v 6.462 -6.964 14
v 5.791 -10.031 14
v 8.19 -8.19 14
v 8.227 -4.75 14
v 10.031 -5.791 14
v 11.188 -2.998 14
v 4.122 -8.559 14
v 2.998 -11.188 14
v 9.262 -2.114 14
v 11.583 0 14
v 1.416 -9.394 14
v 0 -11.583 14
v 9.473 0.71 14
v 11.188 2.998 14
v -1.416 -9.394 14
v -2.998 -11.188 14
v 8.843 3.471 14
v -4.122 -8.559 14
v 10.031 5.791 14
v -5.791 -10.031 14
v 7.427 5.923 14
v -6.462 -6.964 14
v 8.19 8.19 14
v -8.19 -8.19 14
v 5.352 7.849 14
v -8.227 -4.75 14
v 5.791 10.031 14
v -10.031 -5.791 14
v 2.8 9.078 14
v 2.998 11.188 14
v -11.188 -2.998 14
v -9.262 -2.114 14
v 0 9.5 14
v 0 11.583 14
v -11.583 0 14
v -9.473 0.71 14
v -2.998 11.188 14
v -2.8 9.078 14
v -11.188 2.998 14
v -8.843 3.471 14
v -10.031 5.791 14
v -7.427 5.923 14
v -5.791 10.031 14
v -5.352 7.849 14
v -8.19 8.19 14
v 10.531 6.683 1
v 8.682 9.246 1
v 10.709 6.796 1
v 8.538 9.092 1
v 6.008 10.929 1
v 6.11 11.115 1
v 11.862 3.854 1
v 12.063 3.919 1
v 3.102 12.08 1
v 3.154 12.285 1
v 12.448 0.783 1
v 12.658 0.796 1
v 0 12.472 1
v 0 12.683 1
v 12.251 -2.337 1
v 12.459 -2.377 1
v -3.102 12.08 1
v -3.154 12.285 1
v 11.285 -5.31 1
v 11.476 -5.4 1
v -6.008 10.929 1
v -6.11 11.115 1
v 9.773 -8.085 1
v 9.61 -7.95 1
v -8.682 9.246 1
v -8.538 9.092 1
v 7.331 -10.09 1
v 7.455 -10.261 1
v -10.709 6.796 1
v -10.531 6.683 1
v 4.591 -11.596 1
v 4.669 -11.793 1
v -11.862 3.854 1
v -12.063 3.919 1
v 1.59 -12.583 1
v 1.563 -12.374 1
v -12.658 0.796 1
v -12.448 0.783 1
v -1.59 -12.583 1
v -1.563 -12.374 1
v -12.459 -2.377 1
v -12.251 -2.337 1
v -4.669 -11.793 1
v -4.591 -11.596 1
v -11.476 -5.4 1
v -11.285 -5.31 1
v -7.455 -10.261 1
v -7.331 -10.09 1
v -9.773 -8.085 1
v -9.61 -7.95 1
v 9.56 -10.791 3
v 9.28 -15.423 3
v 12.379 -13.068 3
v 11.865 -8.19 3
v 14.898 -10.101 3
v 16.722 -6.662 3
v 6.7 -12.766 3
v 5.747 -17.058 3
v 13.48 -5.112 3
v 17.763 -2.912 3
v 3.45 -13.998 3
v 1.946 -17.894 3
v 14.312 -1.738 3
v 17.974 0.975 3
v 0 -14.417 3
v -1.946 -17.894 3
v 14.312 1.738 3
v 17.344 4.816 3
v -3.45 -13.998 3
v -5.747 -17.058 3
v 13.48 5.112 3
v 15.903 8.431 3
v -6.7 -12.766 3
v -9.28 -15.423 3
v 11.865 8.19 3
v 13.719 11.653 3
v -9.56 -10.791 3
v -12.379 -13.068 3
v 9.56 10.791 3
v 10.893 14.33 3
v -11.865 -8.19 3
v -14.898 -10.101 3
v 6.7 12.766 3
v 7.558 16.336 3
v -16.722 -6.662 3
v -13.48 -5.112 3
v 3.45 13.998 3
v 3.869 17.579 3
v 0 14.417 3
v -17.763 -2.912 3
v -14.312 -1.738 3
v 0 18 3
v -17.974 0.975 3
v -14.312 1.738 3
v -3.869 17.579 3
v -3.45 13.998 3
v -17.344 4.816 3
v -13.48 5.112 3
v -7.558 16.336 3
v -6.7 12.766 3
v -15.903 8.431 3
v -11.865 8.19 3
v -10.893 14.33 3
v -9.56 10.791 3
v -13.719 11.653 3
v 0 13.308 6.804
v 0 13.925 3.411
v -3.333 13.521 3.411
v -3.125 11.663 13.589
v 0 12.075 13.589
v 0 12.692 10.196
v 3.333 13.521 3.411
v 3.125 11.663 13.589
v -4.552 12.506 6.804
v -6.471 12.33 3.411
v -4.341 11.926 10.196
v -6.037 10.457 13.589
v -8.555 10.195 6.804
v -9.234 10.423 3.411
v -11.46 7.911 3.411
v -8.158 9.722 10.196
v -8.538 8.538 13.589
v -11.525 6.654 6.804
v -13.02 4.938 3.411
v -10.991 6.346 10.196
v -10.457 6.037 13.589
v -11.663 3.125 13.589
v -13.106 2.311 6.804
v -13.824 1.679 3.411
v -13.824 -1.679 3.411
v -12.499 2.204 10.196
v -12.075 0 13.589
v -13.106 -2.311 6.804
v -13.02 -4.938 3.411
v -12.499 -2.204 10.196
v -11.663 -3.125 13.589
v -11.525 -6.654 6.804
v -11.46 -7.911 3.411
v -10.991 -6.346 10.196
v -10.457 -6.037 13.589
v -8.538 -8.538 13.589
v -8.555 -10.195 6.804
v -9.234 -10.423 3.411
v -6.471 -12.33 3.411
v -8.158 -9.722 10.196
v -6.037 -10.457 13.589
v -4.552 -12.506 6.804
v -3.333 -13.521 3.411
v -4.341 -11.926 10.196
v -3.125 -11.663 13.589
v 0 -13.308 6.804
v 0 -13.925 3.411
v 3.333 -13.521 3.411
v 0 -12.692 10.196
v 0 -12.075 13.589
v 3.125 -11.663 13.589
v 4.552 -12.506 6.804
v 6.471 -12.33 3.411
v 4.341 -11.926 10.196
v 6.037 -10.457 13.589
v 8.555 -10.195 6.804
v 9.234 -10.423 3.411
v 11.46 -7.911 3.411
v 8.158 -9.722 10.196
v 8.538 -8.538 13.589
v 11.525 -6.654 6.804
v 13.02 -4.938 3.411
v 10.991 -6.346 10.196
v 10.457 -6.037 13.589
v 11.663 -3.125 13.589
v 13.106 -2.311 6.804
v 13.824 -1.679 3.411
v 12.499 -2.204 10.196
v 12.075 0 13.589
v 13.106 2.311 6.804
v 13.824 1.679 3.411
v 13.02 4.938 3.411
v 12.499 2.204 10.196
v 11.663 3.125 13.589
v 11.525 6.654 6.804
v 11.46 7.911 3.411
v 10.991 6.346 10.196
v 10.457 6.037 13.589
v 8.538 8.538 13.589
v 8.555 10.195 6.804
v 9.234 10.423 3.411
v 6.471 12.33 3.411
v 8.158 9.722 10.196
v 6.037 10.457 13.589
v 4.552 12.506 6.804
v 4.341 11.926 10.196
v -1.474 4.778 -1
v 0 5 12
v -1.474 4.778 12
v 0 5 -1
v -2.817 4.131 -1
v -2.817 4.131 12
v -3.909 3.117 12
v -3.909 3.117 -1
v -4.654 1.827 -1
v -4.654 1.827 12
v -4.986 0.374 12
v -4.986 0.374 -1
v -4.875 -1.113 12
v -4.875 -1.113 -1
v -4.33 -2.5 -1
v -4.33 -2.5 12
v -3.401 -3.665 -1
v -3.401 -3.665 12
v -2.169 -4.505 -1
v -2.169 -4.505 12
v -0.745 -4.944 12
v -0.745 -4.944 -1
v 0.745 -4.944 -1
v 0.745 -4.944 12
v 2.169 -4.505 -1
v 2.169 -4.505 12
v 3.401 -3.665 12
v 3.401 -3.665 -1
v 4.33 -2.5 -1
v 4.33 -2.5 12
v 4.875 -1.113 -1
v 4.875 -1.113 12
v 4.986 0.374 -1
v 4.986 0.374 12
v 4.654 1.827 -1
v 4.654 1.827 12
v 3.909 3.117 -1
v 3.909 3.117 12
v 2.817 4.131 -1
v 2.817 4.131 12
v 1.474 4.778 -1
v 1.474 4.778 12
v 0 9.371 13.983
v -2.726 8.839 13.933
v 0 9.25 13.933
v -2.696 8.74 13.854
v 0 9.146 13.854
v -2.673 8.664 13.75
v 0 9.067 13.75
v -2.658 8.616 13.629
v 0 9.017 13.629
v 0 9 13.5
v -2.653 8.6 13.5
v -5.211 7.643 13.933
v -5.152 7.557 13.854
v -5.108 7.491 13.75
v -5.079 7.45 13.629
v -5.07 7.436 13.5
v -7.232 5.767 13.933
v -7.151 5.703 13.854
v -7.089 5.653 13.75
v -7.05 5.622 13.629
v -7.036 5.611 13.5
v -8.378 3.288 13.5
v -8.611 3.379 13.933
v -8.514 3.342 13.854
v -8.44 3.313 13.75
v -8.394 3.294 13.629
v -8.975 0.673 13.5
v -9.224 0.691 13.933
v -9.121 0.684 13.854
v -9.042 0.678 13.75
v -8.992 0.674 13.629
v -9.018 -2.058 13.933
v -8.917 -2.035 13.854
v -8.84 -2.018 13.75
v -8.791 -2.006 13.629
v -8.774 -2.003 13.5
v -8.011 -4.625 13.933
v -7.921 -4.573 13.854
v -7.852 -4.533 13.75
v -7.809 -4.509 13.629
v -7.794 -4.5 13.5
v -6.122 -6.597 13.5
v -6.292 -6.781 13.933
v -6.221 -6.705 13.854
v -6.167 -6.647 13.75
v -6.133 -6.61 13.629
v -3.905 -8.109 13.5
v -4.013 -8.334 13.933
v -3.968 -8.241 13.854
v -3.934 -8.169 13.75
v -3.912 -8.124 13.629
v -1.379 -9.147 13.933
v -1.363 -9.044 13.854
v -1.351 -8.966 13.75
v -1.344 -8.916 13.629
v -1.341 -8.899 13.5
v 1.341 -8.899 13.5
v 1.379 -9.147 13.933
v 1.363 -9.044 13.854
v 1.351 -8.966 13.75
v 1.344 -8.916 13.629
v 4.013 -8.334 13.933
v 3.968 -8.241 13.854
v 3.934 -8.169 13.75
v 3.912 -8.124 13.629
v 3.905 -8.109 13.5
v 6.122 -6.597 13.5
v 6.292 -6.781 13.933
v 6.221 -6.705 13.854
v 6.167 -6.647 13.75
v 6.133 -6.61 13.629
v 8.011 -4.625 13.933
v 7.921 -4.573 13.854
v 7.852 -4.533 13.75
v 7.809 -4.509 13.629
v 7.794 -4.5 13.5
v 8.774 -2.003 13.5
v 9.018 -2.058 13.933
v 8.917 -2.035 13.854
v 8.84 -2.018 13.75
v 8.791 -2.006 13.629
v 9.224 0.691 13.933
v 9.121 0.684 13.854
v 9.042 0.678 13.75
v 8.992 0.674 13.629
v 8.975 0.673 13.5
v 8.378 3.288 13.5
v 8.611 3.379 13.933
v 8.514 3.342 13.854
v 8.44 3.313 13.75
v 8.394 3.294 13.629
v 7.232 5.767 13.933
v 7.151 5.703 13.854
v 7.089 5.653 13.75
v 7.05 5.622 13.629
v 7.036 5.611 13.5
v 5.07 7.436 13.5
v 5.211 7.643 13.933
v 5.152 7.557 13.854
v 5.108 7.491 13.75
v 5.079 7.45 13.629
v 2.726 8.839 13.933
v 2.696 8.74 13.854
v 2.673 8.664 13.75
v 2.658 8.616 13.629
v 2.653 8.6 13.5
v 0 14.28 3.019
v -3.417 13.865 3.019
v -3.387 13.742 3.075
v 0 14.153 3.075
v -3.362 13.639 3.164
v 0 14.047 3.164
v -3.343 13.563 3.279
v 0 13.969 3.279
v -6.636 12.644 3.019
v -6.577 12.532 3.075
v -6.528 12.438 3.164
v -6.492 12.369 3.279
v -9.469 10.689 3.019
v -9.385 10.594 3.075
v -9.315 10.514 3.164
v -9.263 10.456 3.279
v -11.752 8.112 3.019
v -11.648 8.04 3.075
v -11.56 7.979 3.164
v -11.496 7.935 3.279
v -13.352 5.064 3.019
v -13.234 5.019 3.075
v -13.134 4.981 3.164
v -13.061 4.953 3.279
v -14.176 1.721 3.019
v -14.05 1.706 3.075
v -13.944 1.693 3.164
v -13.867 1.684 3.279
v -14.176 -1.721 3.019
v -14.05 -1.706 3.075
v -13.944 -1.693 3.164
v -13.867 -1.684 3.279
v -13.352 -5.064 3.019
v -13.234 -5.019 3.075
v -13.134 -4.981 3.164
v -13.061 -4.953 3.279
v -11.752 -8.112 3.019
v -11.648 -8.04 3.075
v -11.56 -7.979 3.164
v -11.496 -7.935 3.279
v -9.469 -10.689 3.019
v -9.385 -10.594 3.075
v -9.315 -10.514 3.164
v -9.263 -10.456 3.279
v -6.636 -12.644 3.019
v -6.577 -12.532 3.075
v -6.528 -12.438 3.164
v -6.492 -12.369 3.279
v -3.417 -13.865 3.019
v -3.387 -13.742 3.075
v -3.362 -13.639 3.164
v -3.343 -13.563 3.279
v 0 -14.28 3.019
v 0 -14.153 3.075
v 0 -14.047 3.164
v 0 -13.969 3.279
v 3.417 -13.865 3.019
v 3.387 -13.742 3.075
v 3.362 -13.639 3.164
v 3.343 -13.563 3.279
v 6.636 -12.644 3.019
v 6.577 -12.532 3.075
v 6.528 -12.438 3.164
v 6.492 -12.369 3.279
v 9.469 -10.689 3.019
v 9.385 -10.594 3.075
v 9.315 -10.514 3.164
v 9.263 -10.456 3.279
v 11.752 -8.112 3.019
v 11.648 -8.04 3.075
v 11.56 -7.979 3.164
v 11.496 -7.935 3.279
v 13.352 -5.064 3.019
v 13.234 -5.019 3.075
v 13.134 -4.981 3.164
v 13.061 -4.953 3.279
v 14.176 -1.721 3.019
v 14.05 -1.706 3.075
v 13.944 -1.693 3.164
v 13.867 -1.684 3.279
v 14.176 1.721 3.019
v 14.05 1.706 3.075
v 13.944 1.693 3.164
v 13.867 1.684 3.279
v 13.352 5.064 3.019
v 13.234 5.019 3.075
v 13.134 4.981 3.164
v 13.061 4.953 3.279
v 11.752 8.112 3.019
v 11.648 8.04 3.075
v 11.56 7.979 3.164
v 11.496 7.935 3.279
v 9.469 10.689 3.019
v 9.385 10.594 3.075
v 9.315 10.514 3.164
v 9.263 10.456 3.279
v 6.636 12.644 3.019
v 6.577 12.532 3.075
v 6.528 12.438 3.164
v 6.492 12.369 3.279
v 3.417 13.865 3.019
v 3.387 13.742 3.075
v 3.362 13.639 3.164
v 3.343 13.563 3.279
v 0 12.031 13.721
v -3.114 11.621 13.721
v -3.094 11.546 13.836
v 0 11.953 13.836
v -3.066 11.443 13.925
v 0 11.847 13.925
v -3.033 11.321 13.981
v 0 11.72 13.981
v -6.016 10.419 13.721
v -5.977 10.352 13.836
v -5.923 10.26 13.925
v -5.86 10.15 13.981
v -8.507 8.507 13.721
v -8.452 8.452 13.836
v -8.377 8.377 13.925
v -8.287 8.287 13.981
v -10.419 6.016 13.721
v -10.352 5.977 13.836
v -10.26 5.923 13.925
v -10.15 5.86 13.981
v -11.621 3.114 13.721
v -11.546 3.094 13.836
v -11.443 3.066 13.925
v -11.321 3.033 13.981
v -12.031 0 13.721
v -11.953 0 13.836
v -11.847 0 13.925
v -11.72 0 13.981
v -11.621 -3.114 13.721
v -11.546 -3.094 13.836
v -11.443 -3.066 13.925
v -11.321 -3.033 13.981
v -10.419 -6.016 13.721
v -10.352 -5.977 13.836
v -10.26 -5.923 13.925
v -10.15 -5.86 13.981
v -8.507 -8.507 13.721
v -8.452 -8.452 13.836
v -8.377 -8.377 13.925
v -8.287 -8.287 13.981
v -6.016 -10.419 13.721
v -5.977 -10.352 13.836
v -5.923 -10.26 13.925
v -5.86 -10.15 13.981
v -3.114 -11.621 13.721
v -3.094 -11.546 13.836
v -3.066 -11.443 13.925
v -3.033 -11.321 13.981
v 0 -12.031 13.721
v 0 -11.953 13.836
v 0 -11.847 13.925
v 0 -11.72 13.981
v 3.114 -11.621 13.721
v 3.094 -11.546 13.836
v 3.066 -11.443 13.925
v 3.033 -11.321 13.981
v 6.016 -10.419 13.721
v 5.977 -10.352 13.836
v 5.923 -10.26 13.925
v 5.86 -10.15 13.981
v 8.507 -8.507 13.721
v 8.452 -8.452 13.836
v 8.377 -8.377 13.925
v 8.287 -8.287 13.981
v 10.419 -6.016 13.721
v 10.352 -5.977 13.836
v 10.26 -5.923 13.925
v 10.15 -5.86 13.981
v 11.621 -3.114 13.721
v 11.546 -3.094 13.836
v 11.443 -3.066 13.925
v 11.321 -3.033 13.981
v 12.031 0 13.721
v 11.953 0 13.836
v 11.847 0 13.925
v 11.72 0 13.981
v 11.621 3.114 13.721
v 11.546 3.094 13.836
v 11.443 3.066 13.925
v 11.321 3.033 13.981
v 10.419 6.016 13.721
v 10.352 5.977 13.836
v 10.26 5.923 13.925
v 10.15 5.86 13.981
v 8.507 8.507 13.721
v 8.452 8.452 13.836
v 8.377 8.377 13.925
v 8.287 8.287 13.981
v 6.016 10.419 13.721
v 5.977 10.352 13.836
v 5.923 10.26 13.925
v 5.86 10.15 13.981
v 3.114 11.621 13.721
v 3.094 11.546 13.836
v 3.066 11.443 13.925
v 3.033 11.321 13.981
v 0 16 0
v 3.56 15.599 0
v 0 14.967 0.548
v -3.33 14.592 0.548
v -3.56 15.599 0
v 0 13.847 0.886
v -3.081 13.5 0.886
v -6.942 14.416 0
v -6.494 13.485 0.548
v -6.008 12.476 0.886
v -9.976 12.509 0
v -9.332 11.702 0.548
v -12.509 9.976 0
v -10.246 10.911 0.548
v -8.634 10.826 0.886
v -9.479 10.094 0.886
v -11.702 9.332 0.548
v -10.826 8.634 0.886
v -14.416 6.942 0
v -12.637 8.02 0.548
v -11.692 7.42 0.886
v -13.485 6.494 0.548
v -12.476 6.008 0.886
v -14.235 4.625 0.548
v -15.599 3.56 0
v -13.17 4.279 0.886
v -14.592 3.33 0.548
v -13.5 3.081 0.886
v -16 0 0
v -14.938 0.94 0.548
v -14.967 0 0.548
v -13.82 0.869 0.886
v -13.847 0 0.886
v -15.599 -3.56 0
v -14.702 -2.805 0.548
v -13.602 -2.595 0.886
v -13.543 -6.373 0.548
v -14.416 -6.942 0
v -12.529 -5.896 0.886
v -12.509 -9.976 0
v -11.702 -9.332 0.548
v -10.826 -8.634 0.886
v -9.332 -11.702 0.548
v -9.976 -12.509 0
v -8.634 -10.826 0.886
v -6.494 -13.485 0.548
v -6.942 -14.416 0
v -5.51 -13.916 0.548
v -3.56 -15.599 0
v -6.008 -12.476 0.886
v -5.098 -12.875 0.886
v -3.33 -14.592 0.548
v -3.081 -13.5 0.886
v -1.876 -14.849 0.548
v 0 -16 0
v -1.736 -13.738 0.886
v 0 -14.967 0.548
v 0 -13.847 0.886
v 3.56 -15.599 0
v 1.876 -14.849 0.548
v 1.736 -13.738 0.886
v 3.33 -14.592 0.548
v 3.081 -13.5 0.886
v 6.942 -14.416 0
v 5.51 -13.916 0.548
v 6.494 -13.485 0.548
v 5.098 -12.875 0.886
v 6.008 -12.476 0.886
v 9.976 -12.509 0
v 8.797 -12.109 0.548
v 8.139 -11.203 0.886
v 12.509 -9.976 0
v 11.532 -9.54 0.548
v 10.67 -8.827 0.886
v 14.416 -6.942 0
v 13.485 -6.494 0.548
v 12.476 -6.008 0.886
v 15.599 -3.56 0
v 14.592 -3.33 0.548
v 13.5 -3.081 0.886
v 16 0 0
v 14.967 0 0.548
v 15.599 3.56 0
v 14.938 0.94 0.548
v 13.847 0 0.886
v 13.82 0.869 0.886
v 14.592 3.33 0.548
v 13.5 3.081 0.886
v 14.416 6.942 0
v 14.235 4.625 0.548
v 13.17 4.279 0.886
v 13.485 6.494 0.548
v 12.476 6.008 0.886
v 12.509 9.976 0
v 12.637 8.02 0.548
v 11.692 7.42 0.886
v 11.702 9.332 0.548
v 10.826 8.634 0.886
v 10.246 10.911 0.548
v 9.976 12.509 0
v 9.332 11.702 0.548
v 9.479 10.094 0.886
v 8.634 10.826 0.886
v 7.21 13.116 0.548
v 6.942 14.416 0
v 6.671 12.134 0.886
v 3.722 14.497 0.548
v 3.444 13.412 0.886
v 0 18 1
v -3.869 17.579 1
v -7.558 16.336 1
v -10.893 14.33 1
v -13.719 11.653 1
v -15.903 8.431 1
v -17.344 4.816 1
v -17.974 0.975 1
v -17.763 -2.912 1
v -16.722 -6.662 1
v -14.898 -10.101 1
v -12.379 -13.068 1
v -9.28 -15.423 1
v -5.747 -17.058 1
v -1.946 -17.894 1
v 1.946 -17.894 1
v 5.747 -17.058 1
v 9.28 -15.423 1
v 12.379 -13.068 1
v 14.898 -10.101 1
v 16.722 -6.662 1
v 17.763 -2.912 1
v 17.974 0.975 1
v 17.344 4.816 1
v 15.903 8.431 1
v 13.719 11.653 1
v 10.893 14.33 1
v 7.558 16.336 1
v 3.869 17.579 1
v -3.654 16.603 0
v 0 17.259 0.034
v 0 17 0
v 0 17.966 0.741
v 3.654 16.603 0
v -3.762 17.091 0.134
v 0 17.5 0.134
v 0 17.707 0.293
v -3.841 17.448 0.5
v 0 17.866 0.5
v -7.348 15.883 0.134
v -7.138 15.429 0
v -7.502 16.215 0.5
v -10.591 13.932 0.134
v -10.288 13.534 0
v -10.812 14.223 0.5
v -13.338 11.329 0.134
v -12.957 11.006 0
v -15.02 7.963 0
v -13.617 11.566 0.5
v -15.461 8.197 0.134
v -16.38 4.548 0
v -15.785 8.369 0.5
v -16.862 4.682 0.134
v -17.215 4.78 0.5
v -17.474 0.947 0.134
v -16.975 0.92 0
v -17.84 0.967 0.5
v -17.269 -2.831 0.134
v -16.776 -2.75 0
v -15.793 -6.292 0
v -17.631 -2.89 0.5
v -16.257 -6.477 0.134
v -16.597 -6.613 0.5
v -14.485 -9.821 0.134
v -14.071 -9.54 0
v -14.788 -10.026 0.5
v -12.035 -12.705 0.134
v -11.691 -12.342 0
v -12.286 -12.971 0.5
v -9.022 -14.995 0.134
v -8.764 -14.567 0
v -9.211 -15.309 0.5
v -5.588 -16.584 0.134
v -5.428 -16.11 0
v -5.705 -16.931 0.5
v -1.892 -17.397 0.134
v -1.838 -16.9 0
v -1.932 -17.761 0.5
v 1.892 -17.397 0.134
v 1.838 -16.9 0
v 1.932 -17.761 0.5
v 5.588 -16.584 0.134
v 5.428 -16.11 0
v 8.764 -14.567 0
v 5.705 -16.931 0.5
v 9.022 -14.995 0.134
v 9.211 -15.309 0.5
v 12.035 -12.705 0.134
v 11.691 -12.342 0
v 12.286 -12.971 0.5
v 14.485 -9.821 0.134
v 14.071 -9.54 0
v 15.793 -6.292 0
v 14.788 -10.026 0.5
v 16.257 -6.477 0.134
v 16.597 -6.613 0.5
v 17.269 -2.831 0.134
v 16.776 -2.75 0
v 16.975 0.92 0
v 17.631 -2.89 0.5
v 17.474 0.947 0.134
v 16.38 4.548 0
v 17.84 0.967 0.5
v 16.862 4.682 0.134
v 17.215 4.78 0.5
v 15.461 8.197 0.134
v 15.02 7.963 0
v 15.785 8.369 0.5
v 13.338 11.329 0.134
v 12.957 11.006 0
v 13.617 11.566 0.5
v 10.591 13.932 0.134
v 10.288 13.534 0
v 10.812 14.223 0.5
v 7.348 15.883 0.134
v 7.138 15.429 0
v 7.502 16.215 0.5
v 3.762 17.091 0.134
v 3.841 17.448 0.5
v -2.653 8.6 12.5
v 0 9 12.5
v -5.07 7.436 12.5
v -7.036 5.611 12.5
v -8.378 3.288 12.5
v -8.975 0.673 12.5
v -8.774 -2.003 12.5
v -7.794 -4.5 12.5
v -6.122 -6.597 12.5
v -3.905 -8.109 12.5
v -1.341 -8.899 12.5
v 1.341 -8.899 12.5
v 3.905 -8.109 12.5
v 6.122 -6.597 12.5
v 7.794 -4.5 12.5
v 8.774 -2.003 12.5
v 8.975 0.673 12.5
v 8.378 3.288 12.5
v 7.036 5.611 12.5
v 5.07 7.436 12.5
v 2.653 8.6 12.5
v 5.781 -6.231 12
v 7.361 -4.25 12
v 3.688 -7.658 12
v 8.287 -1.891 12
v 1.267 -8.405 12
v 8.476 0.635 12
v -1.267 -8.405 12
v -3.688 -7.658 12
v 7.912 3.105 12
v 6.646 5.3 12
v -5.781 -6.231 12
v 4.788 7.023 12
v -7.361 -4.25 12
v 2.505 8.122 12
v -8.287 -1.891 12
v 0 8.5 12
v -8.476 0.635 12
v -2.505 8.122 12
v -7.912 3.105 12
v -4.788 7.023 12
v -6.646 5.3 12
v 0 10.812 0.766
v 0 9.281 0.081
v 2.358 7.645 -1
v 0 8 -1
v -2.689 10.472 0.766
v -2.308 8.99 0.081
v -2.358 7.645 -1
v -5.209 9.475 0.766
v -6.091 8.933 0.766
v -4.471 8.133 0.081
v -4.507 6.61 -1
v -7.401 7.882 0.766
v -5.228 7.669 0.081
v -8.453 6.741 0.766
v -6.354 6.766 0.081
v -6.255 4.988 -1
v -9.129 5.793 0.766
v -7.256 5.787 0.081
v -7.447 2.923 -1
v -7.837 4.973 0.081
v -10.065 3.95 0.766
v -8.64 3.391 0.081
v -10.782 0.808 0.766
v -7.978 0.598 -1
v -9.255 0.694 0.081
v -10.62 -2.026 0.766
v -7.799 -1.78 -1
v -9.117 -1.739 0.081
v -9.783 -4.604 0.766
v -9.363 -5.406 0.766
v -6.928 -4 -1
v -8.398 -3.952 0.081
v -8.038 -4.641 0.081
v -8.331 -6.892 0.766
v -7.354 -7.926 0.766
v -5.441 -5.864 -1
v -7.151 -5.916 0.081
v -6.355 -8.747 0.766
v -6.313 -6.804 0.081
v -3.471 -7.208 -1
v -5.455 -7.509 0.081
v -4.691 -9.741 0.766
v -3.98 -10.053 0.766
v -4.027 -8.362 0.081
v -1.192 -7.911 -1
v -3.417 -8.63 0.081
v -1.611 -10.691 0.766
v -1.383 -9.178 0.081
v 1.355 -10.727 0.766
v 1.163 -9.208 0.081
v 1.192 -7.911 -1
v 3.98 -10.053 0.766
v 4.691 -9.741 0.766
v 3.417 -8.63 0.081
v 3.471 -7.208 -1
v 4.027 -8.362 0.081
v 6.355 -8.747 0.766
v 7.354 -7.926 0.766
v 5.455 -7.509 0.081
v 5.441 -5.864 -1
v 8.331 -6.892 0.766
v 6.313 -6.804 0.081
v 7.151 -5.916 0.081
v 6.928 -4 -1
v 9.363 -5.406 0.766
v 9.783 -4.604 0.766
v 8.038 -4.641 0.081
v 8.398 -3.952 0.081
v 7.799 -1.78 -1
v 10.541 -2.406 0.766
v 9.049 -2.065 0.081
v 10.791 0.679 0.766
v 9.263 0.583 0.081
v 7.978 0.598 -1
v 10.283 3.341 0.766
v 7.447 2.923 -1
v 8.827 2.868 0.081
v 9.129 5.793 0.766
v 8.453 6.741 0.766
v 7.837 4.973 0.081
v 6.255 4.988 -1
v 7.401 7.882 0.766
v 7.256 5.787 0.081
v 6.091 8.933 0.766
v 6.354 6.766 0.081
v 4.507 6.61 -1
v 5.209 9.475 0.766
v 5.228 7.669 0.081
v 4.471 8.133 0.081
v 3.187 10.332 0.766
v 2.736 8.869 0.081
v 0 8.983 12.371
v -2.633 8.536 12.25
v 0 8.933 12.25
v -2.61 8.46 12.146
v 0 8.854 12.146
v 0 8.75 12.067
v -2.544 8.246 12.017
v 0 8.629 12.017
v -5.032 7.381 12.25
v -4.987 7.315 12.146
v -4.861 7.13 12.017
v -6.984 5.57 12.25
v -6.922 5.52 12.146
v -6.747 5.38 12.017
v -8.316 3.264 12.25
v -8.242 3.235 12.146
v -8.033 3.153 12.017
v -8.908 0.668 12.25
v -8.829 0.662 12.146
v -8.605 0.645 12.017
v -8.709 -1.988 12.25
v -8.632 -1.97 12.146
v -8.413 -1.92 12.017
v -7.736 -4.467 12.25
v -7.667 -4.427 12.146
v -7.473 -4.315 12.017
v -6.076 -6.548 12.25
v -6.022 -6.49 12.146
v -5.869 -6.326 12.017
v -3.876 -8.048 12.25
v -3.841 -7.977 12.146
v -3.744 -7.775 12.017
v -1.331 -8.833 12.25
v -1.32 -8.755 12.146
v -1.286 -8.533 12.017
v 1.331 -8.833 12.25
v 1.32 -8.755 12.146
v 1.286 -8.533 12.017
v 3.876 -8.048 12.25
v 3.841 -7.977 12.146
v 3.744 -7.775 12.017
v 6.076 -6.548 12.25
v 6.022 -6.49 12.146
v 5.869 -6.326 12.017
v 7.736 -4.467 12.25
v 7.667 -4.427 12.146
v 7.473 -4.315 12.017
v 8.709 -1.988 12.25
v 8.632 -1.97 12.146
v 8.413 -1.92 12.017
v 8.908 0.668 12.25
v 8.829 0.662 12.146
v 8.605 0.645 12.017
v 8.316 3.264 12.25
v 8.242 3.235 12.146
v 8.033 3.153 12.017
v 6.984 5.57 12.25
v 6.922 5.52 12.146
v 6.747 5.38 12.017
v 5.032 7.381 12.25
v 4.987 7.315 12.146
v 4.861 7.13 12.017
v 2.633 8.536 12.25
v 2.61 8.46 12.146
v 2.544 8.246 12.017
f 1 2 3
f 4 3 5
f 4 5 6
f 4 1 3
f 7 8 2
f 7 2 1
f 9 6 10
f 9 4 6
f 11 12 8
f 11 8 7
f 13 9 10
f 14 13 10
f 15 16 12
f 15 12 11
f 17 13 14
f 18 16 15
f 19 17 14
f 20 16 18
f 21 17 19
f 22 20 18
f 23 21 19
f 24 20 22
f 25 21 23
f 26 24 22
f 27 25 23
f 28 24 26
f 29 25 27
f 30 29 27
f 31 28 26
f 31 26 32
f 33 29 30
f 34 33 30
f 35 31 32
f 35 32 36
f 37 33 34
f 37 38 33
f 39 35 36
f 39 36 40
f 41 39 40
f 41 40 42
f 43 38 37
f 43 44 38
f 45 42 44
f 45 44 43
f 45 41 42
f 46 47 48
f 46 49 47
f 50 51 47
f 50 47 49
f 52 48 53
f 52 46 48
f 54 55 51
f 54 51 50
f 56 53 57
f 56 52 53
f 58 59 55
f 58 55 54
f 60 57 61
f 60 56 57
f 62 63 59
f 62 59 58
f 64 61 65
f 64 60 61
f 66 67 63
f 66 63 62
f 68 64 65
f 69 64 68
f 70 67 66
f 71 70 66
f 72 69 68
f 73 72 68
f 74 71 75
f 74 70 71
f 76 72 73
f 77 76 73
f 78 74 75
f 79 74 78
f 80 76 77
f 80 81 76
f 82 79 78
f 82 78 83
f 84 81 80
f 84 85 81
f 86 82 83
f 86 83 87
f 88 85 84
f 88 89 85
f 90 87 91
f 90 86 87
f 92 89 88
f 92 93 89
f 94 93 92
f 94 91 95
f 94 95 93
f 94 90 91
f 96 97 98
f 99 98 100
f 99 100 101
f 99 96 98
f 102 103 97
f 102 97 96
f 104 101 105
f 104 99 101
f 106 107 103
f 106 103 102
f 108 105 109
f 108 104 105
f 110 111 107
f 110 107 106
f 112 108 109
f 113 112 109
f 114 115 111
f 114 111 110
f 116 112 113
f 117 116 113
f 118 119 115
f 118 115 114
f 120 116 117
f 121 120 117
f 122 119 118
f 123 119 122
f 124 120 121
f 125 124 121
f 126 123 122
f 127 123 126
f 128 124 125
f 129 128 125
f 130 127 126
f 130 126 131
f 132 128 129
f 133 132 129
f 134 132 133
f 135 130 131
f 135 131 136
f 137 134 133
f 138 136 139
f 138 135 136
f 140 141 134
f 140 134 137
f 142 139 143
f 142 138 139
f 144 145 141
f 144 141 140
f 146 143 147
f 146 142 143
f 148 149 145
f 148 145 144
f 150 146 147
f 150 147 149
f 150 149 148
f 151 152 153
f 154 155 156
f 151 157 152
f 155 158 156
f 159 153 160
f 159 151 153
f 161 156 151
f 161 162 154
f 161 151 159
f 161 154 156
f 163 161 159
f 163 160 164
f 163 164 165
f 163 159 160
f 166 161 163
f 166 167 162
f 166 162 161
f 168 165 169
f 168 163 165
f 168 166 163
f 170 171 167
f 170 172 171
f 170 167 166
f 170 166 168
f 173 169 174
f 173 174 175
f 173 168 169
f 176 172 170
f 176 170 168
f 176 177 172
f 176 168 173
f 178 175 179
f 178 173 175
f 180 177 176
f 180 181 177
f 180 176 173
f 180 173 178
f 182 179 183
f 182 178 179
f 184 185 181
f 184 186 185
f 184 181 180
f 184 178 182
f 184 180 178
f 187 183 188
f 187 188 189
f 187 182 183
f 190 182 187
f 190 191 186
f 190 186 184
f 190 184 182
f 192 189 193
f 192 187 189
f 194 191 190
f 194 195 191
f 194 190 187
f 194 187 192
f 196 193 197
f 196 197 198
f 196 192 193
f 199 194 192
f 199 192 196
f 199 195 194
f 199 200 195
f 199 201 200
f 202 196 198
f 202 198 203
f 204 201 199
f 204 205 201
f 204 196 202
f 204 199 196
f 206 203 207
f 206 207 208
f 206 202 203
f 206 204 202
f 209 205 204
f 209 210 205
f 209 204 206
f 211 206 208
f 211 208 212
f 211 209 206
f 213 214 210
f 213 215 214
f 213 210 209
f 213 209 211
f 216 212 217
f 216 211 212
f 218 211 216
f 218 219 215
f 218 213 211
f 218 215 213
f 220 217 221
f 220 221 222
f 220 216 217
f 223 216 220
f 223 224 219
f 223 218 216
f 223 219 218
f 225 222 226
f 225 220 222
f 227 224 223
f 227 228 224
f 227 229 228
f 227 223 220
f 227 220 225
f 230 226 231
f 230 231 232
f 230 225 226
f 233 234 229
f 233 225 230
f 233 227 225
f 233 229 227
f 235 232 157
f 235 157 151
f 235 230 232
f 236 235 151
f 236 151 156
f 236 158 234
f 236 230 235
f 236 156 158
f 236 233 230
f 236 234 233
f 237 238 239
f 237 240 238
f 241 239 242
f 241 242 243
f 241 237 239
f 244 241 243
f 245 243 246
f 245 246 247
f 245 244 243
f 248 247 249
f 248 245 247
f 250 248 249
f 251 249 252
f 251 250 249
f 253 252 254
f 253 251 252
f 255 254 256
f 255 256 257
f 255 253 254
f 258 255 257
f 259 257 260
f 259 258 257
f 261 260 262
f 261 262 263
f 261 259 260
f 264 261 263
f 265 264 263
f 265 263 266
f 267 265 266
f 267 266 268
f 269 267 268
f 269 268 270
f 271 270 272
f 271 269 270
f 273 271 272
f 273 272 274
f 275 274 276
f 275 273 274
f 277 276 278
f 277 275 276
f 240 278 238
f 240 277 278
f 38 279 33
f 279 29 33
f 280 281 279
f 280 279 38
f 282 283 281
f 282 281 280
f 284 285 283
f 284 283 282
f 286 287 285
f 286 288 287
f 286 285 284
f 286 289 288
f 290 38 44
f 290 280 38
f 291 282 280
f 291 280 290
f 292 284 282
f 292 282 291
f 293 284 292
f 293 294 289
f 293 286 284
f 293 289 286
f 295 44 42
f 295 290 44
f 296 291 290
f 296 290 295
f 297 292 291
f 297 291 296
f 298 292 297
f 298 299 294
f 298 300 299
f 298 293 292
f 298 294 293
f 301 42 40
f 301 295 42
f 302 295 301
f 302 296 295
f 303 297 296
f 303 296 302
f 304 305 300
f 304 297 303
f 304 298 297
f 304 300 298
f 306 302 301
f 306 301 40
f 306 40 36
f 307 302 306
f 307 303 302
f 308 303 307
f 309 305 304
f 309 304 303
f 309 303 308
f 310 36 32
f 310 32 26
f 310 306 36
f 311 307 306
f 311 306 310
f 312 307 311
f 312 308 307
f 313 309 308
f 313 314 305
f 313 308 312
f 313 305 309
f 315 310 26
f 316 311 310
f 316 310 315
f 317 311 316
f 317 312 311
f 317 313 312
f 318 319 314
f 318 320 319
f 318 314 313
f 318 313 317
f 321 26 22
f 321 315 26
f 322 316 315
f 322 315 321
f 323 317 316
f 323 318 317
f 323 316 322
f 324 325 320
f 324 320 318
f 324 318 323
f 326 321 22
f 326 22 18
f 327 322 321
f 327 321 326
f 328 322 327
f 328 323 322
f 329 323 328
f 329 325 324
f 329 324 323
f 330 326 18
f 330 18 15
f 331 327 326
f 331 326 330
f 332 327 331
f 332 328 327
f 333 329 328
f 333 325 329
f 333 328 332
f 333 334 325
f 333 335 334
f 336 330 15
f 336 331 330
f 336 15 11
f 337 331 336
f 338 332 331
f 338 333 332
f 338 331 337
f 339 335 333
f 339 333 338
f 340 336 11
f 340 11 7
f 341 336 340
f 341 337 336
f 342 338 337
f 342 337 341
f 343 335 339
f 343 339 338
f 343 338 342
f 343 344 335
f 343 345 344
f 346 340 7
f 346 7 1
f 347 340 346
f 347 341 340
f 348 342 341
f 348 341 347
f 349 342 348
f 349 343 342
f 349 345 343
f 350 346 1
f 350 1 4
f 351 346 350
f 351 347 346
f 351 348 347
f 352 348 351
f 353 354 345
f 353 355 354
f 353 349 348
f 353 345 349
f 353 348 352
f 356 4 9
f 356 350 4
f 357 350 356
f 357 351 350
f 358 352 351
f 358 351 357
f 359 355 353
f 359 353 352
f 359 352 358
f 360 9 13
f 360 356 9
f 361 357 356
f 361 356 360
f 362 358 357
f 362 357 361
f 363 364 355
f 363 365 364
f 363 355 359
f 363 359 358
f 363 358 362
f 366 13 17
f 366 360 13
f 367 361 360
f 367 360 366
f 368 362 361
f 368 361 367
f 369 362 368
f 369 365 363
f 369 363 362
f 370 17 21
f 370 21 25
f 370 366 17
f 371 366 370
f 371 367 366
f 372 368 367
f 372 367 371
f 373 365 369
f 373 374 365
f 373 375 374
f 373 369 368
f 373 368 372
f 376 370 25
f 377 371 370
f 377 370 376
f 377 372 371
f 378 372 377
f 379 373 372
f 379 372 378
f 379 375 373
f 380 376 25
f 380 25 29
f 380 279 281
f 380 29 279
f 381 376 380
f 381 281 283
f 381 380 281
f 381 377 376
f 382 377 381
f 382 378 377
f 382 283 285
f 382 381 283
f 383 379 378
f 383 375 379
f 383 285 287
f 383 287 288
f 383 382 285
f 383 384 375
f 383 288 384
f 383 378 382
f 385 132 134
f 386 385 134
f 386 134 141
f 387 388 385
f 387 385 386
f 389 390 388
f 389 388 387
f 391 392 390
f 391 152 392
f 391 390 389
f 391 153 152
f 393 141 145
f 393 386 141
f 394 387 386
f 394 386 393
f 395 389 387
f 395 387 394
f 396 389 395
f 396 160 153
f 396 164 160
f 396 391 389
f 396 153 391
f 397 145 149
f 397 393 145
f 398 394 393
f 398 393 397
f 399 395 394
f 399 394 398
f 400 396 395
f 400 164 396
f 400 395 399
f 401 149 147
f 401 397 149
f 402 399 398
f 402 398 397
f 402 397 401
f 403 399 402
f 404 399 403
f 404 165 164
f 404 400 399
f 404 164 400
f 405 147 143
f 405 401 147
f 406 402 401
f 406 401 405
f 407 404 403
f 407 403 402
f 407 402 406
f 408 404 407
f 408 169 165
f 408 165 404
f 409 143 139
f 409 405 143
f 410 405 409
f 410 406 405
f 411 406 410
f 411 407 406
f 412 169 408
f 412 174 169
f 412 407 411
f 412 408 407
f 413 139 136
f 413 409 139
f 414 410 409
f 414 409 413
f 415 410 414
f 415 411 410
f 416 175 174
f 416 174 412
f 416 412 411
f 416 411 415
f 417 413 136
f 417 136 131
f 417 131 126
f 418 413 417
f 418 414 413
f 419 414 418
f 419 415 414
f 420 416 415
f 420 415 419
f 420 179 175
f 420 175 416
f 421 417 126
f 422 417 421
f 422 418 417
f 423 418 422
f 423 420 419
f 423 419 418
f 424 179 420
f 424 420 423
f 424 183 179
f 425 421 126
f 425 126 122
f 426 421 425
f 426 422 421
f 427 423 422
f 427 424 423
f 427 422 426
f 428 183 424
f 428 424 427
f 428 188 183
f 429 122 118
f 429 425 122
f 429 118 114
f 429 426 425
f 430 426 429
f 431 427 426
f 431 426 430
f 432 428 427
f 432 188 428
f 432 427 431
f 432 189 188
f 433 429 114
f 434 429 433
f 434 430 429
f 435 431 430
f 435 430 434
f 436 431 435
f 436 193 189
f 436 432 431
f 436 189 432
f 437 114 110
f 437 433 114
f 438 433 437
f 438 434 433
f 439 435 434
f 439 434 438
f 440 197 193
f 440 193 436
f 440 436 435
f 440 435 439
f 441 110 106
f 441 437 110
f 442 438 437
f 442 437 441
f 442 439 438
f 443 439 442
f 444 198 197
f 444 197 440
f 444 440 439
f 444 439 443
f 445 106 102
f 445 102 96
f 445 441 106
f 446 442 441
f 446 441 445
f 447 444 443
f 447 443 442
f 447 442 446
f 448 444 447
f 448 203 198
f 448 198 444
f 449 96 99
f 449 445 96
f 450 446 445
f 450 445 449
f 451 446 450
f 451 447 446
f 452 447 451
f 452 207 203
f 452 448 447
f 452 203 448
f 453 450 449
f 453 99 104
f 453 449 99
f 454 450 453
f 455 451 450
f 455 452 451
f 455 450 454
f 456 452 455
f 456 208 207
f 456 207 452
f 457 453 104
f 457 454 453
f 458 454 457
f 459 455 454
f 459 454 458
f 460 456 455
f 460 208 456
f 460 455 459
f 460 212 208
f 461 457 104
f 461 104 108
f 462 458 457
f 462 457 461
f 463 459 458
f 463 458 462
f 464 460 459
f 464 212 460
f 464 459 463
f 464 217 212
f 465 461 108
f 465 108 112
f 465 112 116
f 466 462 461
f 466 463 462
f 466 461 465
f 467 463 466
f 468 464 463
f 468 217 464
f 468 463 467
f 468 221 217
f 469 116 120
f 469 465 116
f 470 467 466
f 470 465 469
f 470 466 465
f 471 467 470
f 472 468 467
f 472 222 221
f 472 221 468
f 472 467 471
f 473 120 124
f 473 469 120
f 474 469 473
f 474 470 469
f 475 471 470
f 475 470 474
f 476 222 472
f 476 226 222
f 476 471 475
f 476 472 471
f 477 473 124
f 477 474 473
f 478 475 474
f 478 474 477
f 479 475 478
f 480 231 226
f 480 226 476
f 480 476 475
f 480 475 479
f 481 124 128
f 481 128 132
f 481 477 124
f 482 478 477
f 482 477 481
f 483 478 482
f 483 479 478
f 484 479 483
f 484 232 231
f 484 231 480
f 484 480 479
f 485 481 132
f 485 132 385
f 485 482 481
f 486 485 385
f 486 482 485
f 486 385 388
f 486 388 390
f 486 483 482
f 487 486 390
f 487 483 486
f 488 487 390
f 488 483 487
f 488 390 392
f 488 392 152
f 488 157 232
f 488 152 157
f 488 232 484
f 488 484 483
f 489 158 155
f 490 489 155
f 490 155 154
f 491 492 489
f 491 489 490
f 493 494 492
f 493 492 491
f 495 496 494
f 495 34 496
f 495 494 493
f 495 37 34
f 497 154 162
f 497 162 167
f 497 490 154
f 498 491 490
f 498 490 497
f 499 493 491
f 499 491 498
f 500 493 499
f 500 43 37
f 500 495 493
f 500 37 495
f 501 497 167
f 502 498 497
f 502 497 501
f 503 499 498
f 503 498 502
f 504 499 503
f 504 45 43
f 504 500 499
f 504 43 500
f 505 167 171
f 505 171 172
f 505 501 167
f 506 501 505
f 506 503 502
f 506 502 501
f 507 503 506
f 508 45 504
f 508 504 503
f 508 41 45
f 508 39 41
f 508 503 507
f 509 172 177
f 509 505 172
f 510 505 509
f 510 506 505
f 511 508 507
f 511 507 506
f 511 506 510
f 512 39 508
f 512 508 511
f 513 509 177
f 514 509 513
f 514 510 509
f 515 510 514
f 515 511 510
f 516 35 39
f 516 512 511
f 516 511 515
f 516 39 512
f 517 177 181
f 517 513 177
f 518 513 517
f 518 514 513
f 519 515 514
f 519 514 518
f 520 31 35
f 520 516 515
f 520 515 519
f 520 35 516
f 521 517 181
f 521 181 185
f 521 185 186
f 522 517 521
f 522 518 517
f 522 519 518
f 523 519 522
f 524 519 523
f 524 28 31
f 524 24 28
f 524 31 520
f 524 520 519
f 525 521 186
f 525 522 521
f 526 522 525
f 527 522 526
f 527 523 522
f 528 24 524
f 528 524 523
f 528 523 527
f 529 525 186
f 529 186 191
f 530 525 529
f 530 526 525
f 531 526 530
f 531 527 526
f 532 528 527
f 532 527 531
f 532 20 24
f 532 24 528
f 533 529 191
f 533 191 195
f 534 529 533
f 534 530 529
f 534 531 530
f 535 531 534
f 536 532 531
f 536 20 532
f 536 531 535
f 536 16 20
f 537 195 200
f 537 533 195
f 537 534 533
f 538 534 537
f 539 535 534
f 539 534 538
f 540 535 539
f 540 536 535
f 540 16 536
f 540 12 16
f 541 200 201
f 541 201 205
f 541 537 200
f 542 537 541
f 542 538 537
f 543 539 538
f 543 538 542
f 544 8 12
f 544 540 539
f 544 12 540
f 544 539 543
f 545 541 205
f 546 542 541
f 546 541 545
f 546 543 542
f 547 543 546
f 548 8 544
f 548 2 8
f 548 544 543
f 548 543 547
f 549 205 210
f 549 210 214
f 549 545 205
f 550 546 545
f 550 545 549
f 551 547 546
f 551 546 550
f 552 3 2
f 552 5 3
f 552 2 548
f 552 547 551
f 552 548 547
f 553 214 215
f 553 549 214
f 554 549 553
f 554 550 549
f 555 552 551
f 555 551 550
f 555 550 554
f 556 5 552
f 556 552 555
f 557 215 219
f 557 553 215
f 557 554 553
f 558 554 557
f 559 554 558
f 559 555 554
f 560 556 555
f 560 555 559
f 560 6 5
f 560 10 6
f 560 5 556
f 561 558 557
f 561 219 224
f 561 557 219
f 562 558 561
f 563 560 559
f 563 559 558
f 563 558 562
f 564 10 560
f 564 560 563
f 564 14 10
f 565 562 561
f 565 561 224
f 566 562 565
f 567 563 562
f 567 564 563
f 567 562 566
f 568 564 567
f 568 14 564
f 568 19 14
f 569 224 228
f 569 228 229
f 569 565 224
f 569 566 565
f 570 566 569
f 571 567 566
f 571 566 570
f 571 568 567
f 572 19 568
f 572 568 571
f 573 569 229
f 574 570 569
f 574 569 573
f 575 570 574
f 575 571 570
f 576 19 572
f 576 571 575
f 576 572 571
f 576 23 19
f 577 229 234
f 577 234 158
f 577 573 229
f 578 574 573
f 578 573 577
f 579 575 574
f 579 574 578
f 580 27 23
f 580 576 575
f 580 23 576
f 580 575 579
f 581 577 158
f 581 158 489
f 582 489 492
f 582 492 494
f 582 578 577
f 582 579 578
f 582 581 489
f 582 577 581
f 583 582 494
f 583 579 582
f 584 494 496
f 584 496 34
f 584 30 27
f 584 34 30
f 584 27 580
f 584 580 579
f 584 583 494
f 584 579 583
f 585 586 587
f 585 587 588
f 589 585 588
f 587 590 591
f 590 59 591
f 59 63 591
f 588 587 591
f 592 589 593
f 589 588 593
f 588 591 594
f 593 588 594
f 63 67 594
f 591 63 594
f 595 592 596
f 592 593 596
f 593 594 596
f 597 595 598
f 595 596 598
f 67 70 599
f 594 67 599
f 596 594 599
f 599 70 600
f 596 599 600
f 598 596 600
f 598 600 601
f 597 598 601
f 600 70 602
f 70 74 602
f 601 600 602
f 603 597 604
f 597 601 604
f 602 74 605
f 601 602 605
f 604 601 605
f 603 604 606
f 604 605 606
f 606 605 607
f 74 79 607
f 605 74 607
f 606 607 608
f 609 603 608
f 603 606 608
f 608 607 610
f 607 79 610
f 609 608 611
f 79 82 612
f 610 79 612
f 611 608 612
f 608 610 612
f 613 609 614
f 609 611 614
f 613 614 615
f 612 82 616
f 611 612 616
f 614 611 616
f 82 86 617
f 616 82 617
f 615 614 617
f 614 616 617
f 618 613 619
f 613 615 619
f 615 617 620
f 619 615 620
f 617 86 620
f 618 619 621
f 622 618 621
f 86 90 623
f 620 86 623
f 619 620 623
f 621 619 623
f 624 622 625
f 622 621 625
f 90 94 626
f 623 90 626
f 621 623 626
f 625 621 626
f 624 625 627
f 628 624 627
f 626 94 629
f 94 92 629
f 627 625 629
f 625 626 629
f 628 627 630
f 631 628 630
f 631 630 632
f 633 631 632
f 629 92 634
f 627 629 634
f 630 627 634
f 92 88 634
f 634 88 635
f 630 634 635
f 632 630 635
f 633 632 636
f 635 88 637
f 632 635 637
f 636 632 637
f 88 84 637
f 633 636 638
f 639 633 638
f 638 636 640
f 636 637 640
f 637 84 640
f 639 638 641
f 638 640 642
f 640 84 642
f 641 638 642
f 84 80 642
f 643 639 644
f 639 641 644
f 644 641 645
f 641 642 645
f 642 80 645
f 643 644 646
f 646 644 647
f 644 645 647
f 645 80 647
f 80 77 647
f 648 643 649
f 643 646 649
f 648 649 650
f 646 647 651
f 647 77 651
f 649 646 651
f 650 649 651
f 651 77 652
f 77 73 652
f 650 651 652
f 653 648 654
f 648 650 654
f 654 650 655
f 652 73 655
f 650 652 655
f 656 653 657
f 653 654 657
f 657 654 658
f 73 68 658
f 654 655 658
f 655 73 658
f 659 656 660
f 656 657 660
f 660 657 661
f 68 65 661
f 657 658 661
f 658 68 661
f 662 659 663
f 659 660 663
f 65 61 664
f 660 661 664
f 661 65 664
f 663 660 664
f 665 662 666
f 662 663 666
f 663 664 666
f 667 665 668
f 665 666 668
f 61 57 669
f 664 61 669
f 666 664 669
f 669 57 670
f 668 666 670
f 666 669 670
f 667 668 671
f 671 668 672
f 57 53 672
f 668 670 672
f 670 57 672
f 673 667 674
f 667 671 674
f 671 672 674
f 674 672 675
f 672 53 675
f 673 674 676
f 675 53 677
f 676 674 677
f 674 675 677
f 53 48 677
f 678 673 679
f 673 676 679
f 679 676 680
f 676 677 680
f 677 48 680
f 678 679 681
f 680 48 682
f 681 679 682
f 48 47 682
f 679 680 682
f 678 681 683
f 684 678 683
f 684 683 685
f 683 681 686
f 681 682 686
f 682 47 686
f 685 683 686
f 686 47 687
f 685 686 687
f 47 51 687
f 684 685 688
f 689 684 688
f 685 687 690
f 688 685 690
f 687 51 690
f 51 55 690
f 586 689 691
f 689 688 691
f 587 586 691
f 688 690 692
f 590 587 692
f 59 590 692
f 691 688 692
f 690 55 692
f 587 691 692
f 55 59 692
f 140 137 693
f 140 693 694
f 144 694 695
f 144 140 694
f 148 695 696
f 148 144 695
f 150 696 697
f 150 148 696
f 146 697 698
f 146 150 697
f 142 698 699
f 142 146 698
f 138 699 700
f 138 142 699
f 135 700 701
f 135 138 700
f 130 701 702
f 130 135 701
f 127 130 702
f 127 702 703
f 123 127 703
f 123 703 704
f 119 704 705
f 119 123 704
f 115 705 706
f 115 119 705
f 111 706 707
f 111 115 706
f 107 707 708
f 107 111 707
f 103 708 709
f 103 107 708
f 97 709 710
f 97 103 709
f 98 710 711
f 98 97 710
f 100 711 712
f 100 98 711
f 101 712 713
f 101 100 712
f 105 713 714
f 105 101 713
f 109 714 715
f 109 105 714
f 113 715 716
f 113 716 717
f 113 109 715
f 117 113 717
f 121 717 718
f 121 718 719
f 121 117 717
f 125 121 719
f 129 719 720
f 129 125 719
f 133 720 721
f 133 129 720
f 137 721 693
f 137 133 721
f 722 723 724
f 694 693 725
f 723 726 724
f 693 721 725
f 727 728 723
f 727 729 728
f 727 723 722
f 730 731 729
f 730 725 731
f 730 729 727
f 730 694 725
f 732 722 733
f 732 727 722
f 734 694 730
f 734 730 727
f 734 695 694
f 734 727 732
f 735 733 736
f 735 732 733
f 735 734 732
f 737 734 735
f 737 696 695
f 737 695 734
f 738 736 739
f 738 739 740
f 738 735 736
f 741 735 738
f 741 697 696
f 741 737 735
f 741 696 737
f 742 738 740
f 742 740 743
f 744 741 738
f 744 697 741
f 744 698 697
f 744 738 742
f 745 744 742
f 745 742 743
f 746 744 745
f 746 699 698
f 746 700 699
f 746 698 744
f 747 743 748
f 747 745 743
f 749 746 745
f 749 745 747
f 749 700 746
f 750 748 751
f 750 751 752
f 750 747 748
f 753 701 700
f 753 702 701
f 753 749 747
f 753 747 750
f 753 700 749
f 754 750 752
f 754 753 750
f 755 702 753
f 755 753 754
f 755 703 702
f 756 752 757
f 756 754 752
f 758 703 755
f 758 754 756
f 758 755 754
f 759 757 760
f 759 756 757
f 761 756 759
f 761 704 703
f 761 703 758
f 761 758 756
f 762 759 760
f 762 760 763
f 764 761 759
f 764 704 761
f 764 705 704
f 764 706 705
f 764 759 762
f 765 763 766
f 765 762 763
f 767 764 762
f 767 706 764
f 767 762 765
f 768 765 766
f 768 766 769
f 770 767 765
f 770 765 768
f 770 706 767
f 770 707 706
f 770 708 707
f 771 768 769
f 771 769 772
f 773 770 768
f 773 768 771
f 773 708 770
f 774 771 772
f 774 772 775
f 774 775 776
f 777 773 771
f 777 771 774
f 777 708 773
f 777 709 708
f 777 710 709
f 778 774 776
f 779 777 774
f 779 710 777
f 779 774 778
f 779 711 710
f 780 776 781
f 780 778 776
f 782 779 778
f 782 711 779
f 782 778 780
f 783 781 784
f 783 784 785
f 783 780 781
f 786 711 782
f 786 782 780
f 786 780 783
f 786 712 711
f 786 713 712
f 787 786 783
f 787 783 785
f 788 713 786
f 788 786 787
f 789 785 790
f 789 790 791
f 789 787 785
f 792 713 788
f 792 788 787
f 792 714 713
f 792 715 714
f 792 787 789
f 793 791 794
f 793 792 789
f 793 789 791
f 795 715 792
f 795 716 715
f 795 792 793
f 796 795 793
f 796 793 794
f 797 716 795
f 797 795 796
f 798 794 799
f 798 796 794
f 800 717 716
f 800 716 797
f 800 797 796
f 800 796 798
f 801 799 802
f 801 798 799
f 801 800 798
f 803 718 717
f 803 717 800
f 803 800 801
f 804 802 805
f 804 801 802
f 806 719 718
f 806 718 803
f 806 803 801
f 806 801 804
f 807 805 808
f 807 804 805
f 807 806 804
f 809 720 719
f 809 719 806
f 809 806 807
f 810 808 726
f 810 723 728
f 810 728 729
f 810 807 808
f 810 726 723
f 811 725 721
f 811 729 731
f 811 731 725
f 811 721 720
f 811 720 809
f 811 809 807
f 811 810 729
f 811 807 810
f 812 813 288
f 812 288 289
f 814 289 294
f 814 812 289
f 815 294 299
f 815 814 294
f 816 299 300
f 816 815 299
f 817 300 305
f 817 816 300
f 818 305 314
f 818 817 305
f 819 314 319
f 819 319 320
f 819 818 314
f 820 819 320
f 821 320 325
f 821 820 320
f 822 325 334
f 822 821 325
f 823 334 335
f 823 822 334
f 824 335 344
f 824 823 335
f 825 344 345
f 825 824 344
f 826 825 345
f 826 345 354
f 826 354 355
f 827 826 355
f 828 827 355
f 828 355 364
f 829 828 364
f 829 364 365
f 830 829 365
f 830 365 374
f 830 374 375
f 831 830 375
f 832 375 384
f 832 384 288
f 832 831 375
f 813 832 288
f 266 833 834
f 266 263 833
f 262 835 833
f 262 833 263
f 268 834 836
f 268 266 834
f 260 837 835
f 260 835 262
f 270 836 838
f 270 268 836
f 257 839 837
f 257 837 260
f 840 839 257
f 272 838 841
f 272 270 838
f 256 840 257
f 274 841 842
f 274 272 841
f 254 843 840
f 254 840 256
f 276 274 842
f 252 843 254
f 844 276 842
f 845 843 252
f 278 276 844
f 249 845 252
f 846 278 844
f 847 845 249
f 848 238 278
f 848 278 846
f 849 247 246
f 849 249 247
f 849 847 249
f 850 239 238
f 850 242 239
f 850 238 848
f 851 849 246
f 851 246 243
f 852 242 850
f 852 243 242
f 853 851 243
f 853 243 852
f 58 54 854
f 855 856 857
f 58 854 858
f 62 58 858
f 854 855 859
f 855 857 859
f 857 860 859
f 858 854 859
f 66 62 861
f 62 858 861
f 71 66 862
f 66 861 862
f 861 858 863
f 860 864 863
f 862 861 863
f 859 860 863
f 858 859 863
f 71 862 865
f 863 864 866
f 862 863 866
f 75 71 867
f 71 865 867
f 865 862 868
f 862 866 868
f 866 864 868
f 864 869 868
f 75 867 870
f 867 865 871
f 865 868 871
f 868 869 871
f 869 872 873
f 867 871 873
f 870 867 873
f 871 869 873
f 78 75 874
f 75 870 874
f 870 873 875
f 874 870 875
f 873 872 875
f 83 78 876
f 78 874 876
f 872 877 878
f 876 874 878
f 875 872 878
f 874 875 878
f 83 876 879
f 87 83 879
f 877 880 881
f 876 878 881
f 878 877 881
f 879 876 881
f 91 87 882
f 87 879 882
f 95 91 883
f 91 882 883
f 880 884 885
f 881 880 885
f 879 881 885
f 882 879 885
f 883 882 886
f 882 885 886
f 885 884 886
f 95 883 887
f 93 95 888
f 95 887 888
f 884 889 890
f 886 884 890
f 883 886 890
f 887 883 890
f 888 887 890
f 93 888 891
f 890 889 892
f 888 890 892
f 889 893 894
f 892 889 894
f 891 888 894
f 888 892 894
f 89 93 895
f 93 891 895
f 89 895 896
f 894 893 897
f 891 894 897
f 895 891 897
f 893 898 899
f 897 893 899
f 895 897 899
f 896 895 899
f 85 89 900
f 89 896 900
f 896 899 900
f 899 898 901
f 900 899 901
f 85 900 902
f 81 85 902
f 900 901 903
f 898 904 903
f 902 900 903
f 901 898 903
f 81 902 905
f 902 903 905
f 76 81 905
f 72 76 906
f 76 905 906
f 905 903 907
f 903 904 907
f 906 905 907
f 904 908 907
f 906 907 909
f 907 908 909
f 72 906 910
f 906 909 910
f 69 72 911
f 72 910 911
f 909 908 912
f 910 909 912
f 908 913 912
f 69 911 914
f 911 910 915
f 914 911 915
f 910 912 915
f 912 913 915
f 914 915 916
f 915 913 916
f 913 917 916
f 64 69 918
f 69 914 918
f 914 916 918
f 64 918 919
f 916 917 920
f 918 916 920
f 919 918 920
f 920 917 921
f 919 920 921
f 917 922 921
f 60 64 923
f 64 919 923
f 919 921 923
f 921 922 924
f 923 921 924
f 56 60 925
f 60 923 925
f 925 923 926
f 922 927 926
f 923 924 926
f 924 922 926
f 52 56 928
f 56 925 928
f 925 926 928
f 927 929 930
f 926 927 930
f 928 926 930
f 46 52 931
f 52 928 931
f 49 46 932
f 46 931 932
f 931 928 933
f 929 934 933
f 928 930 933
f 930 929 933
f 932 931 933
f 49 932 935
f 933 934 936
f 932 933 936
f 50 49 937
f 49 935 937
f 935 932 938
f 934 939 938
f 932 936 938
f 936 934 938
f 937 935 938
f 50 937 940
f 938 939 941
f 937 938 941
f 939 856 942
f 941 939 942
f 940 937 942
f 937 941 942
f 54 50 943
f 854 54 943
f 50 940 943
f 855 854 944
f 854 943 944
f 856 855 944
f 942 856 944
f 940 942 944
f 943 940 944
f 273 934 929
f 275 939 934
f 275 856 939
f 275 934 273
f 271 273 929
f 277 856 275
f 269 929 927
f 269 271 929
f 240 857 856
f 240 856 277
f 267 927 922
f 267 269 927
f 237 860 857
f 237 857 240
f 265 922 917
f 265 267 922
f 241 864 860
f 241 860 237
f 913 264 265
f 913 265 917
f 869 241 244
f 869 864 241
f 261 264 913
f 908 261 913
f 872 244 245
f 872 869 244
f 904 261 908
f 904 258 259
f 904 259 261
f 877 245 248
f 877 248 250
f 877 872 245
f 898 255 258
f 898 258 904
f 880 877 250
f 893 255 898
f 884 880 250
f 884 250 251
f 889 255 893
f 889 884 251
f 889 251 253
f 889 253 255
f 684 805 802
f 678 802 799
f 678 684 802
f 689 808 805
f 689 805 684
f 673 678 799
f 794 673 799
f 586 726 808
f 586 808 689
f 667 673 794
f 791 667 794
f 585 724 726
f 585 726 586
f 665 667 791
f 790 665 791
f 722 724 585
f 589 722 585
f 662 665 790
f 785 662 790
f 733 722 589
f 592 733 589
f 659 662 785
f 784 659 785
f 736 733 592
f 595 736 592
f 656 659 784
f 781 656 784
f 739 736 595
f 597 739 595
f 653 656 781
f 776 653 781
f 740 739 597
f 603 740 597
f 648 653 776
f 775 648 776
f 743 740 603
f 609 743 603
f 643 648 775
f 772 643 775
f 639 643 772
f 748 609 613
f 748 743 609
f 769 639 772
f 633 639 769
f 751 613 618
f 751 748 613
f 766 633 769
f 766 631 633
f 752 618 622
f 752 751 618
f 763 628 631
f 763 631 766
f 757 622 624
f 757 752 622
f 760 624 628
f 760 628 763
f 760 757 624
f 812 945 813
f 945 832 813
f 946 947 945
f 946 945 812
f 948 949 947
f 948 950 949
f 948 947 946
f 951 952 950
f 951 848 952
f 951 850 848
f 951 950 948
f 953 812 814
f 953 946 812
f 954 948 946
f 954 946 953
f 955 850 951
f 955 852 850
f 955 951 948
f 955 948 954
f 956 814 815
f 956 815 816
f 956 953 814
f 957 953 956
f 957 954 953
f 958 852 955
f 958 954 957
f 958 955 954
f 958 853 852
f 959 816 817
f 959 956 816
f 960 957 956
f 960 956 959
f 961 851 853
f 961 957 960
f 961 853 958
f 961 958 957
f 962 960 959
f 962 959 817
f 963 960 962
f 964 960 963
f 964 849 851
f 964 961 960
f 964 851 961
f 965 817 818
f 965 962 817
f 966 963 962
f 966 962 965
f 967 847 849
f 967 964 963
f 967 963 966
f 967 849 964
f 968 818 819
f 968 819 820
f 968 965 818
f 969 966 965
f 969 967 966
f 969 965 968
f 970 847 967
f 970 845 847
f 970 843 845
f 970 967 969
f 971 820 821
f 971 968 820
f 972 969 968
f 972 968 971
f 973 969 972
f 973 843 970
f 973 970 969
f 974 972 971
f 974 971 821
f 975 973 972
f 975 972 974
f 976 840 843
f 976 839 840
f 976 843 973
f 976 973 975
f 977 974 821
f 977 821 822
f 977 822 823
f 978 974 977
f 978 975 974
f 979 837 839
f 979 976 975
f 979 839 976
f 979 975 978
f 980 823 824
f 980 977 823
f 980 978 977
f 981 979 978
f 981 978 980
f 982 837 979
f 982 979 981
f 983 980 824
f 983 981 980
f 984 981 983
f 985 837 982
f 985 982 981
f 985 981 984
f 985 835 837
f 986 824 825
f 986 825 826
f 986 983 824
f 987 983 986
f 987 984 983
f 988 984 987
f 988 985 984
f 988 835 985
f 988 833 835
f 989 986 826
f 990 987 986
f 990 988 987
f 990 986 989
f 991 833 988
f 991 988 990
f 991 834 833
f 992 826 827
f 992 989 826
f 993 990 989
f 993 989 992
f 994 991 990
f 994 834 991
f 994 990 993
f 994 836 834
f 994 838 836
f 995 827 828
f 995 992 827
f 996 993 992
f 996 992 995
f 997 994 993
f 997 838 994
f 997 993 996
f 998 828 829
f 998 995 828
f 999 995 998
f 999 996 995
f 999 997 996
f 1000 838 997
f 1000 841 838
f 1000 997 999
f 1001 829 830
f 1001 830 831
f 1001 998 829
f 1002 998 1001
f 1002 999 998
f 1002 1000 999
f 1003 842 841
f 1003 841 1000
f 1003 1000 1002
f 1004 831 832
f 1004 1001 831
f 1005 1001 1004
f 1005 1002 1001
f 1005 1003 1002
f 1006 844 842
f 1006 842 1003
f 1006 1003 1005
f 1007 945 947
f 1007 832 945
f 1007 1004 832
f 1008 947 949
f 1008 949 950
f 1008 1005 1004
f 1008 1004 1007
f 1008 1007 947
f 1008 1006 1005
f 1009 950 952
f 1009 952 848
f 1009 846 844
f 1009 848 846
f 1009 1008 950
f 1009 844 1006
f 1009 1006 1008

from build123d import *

# Parameters (mm, degrees)
F0_W = 3
F0_H = 1
F2_R = 1
F3_R = 0.5


# Not quite as in the source:
# - a fillet or chamfer that OpenCascade refuses, or shapes differently, is made with other operations: its cross-section is extruded or revolved along the edge and cut away or added


with BuildPart() as f1:
    # F0 (on Right) → F1 (revolve)
    with BuildSketch(Plane.YZ):
        Polygon((16, 0), (18, 0), (18, 3), (14, 3), (12, 14), (9, 14), (9, 12), (5, 12), (5, 0), (8, 0), (8, 1), (16, 1), align=None)
        with Locations((6.5, -0.5)):
            Rectangle(F0_W, F0_H)
    revolve(axis=Axis((0, 0, 16.8723911047), (0, 0, 1)))

    # F2
    f2_edges = [f1.edges().sort_by_distance(p)[0] for p in [
        (0, -18, 0),
    ]]
    fillet(f2_edges, radius=F2_R)

    # F3
    f3_edges = [f1.edges().sort_by_distance(p)[0] for p in [
        (0, -12, 14),
        (0, -14, 3),
        (0, -9, 12),
        (0, -9, 14),
    ]]
    fillet(f3_edges, radius=F3_R)

    # F4: fillet of radius 6 on 2 edges, made by hand

    # F4_s1 → F4_t2 (revolve)
    with BuildSketch(Plane.YZ):
        with BuildLine():
            ThreePointArc((12.472135955, 1), (10.0226462122, 0.4772255751), (8, -1))
            Line((8, -1), (8, 1))
            Line((8, 1), (12.472135955, 1))
        make_face()
    revolve(axis=Axis((0, 0, 1), (0, 0, 1)))

    # F4_s3 → F4_t4 (revolve)
    with BuildSketch(Plane.YZ):
        with BuildLine():
            ThreePointArc((16, 0), (14.4154260172, 0.7445626465), (12.6833752096, 1))
            Line((12.6833752096, 1), (16, 1))
            Line((16, 1), (16, 0))
        make_face()
    revolve(axis=Axis((0, 0, 1), (0, 0, 1)))


solid = f1.part
